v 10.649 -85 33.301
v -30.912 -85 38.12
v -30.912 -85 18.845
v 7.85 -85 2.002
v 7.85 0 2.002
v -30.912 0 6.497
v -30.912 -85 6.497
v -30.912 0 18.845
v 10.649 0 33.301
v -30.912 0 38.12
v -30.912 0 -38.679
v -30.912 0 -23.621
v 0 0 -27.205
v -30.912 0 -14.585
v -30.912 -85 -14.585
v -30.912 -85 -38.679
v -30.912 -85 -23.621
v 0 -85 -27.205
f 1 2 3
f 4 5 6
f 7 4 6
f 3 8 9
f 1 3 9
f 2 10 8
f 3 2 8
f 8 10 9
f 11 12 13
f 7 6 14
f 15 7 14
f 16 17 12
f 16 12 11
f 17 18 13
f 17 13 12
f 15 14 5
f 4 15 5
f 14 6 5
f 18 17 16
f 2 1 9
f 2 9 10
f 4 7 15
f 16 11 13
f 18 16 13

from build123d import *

# Parameters (mm, degrees)
F1_DEPTH = 85


with BuildPart() as f1:
    # F0 (on Front) → F1 (new body)
    with BuildSketch(Plane.XZ):
        Polygon((-30.912245, 38.119581), (-30.912245, 18.844591), (10.649446, 33.300832), align=None)
        Polygon((-30.912245, 6.496552), (-30.912245, -14.585465), (7.849954, 2.002383), align=None)
        Polygon((-30.912245, -23.620617), (-30.912245, -38.679201), (0, -27.204646), align=None)
    extrude(amount=F1_DEPTH)


solid = f1.part
